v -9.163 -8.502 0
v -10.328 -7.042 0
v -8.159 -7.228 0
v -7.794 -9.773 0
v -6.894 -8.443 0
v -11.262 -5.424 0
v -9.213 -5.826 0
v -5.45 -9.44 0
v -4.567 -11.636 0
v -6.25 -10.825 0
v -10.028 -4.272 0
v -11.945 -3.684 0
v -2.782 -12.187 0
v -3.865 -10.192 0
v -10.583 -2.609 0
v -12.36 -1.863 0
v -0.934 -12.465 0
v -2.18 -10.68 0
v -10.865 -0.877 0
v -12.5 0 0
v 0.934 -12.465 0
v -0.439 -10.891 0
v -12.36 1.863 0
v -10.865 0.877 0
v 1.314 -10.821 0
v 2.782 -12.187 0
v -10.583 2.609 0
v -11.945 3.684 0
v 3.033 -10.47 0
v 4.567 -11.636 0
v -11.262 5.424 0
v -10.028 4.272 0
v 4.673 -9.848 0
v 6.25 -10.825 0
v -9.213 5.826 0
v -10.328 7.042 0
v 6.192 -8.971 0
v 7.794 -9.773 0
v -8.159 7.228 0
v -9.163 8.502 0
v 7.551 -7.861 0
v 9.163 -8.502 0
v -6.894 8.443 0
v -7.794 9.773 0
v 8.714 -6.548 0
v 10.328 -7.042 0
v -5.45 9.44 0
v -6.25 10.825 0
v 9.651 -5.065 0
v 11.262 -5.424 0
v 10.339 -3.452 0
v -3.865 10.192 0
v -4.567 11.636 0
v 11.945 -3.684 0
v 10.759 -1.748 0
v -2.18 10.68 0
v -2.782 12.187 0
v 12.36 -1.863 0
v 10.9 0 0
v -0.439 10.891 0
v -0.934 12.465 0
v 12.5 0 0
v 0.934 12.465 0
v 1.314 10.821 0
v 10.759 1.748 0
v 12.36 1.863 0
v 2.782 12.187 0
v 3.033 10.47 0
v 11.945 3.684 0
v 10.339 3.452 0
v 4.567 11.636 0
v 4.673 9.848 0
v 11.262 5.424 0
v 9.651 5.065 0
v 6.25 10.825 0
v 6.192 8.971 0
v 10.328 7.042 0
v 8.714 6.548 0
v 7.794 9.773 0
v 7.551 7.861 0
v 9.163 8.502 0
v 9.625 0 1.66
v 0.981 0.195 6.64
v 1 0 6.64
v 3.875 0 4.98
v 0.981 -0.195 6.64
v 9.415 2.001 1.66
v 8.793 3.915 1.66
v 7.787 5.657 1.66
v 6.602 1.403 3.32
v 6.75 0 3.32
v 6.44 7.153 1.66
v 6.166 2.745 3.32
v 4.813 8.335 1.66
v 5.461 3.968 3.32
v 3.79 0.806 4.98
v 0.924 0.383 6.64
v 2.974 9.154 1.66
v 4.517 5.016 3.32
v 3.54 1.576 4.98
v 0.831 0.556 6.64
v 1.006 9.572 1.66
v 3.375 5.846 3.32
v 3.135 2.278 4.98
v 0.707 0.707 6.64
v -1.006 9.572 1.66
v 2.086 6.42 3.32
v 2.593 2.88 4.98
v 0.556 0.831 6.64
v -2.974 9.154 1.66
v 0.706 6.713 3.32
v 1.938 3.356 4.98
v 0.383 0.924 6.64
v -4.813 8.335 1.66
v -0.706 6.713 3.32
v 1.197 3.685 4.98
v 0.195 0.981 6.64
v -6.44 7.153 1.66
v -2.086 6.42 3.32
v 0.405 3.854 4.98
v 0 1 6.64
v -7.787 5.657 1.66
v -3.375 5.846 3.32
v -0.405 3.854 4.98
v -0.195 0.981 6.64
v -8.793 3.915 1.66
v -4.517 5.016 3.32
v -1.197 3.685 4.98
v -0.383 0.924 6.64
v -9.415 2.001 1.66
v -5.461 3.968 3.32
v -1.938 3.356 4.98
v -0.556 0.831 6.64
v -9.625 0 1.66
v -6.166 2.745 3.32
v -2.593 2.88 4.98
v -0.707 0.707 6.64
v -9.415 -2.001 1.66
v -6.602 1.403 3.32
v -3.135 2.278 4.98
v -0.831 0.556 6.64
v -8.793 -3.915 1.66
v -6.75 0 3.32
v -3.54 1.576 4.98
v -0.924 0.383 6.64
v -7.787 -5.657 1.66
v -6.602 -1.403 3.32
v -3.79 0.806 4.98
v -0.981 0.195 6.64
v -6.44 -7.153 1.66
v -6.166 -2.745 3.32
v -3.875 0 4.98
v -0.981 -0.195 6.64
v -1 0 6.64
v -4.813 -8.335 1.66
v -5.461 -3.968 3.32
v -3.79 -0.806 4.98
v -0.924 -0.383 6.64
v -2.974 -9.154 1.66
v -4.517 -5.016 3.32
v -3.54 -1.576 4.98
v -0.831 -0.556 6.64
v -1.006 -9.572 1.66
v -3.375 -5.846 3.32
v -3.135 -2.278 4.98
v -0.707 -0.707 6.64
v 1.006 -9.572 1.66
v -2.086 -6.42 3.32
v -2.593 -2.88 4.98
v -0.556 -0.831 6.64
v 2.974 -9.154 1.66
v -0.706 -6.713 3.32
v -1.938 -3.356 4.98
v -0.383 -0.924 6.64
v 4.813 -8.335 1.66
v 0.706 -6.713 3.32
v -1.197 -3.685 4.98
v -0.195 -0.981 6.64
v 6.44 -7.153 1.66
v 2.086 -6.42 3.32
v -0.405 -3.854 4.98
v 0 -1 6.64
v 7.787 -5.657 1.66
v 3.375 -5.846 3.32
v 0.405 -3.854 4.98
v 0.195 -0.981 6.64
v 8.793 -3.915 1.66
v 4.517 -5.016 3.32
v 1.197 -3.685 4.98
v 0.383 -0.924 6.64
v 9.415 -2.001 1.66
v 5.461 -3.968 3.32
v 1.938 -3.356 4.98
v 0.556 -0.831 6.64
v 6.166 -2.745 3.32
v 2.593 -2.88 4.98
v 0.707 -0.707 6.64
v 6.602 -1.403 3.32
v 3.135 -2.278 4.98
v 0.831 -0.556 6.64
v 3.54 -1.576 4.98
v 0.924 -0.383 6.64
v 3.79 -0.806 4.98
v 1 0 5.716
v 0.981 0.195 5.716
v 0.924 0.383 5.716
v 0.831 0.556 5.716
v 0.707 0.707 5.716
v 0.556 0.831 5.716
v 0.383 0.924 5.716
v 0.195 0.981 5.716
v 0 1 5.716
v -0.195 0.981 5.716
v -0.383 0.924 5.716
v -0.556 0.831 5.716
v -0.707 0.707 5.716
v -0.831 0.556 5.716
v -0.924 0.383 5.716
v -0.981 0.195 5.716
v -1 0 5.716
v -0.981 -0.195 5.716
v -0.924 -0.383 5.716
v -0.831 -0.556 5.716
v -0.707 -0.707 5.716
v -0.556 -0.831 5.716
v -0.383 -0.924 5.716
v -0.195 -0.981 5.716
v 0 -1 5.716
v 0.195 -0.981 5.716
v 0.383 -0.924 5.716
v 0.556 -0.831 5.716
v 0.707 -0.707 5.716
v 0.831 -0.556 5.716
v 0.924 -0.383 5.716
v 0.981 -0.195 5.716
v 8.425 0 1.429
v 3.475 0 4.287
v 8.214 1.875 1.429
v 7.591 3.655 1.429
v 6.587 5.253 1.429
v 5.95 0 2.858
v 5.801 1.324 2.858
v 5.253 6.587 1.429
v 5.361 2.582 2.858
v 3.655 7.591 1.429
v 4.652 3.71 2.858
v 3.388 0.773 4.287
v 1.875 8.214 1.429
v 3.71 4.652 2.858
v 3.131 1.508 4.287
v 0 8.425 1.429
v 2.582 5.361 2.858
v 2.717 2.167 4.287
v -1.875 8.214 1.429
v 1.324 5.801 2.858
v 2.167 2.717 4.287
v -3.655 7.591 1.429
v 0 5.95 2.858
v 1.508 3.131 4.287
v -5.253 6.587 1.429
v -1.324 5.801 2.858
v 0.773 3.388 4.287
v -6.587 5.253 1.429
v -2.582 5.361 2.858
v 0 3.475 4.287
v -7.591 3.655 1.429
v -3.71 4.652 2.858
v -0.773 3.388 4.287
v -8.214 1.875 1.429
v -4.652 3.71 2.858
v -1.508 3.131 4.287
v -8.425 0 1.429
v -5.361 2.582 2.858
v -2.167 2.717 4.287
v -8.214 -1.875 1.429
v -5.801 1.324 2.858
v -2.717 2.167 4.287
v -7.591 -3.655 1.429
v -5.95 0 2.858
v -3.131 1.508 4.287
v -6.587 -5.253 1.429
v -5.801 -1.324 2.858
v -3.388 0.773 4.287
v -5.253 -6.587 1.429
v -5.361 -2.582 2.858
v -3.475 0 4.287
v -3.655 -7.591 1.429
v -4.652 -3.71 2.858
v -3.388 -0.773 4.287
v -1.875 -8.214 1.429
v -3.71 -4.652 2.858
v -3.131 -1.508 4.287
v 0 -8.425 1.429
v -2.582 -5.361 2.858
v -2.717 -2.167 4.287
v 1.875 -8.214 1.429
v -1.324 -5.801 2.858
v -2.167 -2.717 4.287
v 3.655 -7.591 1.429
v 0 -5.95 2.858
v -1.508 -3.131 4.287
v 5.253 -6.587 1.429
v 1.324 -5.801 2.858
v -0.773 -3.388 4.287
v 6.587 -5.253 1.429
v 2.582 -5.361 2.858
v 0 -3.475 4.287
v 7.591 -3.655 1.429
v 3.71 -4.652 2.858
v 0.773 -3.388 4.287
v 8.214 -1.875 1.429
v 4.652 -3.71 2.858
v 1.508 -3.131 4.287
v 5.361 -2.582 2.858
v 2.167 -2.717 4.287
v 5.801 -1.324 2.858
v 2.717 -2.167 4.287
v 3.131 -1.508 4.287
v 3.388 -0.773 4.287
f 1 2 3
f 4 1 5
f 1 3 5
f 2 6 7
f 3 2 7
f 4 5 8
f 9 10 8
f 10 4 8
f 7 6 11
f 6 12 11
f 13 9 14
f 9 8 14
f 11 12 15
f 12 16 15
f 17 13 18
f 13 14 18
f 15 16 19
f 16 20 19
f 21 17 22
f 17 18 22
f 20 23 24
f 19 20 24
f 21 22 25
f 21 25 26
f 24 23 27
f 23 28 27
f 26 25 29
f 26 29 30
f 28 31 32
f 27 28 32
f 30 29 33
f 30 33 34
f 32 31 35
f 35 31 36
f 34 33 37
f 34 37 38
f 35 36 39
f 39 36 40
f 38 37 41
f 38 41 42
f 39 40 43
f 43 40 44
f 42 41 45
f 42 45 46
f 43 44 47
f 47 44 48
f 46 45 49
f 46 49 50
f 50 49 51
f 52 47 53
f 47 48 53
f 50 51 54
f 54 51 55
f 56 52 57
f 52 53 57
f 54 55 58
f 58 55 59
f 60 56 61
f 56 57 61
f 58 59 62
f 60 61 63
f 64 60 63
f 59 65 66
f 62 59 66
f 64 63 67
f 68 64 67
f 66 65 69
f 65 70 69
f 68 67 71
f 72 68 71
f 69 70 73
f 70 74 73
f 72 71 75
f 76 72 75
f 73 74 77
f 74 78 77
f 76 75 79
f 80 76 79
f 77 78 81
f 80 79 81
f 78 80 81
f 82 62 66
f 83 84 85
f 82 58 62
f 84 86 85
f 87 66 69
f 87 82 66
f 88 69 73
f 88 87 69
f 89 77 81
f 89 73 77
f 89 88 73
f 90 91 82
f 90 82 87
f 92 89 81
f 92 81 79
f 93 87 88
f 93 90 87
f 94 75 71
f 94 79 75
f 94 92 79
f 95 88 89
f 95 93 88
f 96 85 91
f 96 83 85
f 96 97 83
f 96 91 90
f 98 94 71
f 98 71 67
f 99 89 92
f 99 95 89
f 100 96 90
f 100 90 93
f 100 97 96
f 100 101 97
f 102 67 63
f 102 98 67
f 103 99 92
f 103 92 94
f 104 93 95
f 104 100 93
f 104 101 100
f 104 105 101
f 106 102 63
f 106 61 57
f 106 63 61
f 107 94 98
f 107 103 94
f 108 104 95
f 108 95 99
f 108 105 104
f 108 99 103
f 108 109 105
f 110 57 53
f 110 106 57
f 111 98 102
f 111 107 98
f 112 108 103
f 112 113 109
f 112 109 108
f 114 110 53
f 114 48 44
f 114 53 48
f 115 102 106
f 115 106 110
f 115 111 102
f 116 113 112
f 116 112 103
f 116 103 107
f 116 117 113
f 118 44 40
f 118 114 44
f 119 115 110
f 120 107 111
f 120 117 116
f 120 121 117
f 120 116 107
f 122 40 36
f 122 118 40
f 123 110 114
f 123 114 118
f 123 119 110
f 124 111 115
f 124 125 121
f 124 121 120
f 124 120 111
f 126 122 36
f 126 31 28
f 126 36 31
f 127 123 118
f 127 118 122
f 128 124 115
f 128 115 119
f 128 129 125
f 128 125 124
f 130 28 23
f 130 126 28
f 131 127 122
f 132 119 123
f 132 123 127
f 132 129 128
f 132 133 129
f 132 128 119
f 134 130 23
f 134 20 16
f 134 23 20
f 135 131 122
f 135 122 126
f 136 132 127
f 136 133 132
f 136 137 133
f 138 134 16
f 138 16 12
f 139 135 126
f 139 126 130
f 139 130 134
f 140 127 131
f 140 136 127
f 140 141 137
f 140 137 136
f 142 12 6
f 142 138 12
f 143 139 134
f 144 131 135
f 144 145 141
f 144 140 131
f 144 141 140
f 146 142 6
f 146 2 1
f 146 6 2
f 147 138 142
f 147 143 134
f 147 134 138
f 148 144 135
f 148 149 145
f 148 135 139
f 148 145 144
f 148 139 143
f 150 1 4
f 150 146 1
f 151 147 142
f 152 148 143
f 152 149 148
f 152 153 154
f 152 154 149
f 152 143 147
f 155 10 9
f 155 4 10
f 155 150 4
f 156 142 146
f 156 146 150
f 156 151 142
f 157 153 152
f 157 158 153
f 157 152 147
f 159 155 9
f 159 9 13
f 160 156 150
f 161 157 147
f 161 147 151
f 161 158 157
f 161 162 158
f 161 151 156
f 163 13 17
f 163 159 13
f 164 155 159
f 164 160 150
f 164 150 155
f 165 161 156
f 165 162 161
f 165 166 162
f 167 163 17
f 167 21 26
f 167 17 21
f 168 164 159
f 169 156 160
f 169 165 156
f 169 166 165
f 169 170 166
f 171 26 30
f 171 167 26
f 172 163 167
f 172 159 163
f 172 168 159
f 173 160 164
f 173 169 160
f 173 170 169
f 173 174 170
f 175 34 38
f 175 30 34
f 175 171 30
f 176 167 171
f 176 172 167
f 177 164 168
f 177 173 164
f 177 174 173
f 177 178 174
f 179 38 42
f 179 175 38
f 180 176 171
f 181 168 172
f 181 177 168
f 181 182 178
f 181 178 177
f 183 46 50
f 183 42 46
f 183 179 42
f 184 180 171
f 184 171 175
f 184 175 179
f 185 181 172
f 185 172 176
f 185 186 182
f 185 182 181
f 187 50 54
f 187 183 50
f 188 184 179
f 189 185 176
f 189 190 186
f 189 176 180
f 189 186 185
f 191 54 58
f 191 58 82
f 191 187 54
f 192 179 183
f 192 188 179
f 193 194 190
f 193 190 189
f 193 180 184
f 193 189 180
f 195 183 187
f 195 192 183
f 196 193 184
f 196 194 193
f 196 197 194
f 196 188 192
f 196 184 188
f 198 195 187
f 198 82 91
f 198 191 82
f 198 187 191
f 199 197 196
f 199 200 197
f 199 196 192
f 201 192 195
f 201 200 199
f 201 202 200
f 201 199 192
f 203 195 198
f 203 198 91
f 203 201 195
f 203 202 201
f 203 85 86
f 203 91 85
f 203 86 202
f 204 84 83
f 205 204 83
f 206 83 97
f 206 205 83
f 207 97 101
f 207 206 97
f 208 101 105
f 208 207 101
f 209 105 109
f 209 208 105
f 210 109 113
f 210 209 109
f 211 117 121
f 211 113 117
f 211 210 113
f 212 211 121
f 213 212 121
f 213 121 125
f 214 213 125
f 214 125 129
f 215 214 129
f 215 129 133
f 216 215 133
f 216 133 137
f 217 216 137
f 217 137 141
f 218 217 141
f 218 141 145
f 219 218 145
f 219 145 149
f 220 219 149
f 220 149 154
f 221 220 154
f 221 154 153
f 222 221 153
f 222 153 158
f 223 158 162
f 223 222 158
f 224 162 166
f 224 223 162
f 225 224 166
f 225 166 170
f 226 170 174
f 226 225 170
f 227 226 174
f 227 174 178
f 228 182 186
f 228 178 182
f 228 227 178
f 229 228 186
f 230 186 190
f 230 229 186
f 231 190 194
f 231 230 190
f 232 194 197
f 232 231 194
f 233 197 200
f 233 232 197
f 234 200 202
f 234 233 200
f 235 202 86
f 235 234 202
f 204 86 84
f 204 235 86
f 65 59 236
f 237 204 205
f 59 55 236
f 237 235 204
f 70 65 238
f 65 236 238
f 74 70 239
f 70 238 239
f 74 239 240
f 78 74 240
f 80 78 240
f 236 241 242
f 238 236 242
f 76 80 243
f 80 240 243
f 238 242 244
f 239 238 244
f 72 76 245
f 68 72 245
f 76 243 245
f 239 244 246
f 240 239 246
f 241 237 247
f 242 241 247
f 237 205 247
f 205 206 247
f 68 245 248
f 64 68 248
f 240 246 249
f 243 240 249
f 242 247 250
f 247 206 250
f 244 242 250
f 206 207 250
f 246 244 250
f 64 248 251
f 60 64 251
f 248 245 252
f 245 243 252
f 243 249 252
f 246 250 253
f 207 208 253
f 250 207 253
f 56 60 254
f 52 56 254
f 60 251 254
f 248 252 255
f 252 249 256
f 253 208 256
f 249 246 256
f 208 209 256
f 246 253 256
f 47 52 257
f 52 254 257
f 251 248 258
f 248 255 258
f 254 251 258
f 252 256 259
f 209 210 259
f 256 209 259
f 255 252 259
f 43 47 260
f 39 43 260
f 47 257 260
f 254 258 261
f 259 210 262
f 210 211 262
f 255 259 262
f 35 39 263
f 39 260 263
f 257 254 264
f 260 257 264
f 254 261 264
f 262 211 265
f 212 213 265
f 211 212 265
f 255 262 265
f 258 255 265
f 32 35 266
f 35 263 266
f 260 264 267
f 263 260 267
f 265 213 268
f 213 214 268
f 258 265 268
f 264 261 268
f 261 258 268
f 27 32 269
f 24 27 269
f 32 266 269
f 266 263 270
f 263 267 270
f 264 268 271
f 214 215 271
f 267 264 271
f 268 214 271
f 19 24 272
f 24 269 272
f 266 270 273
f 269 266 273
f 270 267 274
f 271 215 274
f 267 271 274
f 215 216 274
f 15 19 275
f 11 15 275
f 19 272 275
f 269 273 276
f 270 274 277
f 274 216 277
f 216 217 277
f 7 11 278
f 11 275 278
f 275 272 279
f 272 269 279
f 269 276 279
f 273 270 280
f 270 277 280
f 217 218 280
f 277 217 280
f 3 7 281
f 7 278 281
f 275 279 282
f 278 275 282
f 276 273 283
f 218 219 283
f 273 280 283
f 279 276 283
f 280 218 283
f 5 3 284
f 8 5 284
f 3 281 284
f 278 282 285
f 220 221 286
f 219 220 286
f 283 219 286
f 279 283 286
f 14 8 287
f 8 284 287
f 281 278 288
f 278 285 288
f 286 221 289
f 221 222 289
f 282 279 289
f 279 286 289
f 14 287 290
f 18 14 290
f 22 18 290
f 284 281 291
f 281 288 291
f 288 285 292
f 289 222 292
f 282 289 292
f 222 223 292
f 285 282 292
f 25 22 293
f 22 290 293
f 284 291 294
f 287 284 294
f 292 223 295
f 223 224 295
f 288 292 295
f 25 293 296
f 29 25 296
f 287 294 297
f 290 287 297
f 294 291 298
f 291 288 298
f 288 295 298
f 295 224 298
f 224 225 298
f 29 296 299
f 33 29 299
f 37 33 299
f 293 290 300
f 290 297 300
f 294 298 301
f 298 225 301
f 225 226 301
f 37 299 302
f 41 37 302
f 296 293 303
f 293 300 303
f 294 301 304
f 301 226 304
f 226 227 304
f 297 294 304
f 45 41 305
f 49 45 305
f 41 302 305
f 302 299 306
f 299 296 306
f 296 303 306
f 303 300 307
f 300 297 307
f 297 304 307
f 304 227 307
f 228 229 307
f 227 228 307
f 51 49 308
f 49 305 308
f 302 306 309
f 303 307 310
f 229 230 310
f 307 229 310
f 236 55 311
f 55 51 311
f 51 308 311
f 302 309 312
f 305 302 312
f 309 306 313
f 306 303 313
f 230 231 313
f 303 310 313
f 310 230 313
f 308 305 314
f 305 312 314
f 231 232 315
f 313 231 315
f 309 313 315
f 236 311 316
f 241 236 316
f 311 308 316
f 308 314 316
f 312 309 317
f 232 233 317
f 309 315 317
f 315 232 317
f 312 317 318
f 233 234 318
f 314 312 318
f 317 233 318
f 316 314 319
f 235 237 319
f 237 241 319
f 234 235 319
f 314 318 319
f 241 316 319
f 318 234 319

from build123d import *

# Parameters (mm, degrees)
F0_R     = 12.5
F1_DEPTH = 7.5
F1_TAPER = 60
F3_T     = -0.8
F2_R     = 1
F4_DEPTH = 25


with BuildPart() as f1:
    # F0 (on Top) → F1 (new body)
    with BuildSketch(Plane.XY):
        Circle(F0_R)
    extrude(amount=F1_DEPTH, taper=F1_TAPER)

    # F3
    f3_openings = [f1.faces().sort_by_distance(p)[0] for p in [
        (0, 0, 0),
    ]]
    offset(amount=F3_T, openings=f3_openings)

    # F2 (on Top) → F4 (cut)
    with BuildSketch(Plane.XY):
        Circle(F2_R)
    extrude(amount=F4_DEPTH, mode=Mode.SUBTRACT)


solid = f1.part
